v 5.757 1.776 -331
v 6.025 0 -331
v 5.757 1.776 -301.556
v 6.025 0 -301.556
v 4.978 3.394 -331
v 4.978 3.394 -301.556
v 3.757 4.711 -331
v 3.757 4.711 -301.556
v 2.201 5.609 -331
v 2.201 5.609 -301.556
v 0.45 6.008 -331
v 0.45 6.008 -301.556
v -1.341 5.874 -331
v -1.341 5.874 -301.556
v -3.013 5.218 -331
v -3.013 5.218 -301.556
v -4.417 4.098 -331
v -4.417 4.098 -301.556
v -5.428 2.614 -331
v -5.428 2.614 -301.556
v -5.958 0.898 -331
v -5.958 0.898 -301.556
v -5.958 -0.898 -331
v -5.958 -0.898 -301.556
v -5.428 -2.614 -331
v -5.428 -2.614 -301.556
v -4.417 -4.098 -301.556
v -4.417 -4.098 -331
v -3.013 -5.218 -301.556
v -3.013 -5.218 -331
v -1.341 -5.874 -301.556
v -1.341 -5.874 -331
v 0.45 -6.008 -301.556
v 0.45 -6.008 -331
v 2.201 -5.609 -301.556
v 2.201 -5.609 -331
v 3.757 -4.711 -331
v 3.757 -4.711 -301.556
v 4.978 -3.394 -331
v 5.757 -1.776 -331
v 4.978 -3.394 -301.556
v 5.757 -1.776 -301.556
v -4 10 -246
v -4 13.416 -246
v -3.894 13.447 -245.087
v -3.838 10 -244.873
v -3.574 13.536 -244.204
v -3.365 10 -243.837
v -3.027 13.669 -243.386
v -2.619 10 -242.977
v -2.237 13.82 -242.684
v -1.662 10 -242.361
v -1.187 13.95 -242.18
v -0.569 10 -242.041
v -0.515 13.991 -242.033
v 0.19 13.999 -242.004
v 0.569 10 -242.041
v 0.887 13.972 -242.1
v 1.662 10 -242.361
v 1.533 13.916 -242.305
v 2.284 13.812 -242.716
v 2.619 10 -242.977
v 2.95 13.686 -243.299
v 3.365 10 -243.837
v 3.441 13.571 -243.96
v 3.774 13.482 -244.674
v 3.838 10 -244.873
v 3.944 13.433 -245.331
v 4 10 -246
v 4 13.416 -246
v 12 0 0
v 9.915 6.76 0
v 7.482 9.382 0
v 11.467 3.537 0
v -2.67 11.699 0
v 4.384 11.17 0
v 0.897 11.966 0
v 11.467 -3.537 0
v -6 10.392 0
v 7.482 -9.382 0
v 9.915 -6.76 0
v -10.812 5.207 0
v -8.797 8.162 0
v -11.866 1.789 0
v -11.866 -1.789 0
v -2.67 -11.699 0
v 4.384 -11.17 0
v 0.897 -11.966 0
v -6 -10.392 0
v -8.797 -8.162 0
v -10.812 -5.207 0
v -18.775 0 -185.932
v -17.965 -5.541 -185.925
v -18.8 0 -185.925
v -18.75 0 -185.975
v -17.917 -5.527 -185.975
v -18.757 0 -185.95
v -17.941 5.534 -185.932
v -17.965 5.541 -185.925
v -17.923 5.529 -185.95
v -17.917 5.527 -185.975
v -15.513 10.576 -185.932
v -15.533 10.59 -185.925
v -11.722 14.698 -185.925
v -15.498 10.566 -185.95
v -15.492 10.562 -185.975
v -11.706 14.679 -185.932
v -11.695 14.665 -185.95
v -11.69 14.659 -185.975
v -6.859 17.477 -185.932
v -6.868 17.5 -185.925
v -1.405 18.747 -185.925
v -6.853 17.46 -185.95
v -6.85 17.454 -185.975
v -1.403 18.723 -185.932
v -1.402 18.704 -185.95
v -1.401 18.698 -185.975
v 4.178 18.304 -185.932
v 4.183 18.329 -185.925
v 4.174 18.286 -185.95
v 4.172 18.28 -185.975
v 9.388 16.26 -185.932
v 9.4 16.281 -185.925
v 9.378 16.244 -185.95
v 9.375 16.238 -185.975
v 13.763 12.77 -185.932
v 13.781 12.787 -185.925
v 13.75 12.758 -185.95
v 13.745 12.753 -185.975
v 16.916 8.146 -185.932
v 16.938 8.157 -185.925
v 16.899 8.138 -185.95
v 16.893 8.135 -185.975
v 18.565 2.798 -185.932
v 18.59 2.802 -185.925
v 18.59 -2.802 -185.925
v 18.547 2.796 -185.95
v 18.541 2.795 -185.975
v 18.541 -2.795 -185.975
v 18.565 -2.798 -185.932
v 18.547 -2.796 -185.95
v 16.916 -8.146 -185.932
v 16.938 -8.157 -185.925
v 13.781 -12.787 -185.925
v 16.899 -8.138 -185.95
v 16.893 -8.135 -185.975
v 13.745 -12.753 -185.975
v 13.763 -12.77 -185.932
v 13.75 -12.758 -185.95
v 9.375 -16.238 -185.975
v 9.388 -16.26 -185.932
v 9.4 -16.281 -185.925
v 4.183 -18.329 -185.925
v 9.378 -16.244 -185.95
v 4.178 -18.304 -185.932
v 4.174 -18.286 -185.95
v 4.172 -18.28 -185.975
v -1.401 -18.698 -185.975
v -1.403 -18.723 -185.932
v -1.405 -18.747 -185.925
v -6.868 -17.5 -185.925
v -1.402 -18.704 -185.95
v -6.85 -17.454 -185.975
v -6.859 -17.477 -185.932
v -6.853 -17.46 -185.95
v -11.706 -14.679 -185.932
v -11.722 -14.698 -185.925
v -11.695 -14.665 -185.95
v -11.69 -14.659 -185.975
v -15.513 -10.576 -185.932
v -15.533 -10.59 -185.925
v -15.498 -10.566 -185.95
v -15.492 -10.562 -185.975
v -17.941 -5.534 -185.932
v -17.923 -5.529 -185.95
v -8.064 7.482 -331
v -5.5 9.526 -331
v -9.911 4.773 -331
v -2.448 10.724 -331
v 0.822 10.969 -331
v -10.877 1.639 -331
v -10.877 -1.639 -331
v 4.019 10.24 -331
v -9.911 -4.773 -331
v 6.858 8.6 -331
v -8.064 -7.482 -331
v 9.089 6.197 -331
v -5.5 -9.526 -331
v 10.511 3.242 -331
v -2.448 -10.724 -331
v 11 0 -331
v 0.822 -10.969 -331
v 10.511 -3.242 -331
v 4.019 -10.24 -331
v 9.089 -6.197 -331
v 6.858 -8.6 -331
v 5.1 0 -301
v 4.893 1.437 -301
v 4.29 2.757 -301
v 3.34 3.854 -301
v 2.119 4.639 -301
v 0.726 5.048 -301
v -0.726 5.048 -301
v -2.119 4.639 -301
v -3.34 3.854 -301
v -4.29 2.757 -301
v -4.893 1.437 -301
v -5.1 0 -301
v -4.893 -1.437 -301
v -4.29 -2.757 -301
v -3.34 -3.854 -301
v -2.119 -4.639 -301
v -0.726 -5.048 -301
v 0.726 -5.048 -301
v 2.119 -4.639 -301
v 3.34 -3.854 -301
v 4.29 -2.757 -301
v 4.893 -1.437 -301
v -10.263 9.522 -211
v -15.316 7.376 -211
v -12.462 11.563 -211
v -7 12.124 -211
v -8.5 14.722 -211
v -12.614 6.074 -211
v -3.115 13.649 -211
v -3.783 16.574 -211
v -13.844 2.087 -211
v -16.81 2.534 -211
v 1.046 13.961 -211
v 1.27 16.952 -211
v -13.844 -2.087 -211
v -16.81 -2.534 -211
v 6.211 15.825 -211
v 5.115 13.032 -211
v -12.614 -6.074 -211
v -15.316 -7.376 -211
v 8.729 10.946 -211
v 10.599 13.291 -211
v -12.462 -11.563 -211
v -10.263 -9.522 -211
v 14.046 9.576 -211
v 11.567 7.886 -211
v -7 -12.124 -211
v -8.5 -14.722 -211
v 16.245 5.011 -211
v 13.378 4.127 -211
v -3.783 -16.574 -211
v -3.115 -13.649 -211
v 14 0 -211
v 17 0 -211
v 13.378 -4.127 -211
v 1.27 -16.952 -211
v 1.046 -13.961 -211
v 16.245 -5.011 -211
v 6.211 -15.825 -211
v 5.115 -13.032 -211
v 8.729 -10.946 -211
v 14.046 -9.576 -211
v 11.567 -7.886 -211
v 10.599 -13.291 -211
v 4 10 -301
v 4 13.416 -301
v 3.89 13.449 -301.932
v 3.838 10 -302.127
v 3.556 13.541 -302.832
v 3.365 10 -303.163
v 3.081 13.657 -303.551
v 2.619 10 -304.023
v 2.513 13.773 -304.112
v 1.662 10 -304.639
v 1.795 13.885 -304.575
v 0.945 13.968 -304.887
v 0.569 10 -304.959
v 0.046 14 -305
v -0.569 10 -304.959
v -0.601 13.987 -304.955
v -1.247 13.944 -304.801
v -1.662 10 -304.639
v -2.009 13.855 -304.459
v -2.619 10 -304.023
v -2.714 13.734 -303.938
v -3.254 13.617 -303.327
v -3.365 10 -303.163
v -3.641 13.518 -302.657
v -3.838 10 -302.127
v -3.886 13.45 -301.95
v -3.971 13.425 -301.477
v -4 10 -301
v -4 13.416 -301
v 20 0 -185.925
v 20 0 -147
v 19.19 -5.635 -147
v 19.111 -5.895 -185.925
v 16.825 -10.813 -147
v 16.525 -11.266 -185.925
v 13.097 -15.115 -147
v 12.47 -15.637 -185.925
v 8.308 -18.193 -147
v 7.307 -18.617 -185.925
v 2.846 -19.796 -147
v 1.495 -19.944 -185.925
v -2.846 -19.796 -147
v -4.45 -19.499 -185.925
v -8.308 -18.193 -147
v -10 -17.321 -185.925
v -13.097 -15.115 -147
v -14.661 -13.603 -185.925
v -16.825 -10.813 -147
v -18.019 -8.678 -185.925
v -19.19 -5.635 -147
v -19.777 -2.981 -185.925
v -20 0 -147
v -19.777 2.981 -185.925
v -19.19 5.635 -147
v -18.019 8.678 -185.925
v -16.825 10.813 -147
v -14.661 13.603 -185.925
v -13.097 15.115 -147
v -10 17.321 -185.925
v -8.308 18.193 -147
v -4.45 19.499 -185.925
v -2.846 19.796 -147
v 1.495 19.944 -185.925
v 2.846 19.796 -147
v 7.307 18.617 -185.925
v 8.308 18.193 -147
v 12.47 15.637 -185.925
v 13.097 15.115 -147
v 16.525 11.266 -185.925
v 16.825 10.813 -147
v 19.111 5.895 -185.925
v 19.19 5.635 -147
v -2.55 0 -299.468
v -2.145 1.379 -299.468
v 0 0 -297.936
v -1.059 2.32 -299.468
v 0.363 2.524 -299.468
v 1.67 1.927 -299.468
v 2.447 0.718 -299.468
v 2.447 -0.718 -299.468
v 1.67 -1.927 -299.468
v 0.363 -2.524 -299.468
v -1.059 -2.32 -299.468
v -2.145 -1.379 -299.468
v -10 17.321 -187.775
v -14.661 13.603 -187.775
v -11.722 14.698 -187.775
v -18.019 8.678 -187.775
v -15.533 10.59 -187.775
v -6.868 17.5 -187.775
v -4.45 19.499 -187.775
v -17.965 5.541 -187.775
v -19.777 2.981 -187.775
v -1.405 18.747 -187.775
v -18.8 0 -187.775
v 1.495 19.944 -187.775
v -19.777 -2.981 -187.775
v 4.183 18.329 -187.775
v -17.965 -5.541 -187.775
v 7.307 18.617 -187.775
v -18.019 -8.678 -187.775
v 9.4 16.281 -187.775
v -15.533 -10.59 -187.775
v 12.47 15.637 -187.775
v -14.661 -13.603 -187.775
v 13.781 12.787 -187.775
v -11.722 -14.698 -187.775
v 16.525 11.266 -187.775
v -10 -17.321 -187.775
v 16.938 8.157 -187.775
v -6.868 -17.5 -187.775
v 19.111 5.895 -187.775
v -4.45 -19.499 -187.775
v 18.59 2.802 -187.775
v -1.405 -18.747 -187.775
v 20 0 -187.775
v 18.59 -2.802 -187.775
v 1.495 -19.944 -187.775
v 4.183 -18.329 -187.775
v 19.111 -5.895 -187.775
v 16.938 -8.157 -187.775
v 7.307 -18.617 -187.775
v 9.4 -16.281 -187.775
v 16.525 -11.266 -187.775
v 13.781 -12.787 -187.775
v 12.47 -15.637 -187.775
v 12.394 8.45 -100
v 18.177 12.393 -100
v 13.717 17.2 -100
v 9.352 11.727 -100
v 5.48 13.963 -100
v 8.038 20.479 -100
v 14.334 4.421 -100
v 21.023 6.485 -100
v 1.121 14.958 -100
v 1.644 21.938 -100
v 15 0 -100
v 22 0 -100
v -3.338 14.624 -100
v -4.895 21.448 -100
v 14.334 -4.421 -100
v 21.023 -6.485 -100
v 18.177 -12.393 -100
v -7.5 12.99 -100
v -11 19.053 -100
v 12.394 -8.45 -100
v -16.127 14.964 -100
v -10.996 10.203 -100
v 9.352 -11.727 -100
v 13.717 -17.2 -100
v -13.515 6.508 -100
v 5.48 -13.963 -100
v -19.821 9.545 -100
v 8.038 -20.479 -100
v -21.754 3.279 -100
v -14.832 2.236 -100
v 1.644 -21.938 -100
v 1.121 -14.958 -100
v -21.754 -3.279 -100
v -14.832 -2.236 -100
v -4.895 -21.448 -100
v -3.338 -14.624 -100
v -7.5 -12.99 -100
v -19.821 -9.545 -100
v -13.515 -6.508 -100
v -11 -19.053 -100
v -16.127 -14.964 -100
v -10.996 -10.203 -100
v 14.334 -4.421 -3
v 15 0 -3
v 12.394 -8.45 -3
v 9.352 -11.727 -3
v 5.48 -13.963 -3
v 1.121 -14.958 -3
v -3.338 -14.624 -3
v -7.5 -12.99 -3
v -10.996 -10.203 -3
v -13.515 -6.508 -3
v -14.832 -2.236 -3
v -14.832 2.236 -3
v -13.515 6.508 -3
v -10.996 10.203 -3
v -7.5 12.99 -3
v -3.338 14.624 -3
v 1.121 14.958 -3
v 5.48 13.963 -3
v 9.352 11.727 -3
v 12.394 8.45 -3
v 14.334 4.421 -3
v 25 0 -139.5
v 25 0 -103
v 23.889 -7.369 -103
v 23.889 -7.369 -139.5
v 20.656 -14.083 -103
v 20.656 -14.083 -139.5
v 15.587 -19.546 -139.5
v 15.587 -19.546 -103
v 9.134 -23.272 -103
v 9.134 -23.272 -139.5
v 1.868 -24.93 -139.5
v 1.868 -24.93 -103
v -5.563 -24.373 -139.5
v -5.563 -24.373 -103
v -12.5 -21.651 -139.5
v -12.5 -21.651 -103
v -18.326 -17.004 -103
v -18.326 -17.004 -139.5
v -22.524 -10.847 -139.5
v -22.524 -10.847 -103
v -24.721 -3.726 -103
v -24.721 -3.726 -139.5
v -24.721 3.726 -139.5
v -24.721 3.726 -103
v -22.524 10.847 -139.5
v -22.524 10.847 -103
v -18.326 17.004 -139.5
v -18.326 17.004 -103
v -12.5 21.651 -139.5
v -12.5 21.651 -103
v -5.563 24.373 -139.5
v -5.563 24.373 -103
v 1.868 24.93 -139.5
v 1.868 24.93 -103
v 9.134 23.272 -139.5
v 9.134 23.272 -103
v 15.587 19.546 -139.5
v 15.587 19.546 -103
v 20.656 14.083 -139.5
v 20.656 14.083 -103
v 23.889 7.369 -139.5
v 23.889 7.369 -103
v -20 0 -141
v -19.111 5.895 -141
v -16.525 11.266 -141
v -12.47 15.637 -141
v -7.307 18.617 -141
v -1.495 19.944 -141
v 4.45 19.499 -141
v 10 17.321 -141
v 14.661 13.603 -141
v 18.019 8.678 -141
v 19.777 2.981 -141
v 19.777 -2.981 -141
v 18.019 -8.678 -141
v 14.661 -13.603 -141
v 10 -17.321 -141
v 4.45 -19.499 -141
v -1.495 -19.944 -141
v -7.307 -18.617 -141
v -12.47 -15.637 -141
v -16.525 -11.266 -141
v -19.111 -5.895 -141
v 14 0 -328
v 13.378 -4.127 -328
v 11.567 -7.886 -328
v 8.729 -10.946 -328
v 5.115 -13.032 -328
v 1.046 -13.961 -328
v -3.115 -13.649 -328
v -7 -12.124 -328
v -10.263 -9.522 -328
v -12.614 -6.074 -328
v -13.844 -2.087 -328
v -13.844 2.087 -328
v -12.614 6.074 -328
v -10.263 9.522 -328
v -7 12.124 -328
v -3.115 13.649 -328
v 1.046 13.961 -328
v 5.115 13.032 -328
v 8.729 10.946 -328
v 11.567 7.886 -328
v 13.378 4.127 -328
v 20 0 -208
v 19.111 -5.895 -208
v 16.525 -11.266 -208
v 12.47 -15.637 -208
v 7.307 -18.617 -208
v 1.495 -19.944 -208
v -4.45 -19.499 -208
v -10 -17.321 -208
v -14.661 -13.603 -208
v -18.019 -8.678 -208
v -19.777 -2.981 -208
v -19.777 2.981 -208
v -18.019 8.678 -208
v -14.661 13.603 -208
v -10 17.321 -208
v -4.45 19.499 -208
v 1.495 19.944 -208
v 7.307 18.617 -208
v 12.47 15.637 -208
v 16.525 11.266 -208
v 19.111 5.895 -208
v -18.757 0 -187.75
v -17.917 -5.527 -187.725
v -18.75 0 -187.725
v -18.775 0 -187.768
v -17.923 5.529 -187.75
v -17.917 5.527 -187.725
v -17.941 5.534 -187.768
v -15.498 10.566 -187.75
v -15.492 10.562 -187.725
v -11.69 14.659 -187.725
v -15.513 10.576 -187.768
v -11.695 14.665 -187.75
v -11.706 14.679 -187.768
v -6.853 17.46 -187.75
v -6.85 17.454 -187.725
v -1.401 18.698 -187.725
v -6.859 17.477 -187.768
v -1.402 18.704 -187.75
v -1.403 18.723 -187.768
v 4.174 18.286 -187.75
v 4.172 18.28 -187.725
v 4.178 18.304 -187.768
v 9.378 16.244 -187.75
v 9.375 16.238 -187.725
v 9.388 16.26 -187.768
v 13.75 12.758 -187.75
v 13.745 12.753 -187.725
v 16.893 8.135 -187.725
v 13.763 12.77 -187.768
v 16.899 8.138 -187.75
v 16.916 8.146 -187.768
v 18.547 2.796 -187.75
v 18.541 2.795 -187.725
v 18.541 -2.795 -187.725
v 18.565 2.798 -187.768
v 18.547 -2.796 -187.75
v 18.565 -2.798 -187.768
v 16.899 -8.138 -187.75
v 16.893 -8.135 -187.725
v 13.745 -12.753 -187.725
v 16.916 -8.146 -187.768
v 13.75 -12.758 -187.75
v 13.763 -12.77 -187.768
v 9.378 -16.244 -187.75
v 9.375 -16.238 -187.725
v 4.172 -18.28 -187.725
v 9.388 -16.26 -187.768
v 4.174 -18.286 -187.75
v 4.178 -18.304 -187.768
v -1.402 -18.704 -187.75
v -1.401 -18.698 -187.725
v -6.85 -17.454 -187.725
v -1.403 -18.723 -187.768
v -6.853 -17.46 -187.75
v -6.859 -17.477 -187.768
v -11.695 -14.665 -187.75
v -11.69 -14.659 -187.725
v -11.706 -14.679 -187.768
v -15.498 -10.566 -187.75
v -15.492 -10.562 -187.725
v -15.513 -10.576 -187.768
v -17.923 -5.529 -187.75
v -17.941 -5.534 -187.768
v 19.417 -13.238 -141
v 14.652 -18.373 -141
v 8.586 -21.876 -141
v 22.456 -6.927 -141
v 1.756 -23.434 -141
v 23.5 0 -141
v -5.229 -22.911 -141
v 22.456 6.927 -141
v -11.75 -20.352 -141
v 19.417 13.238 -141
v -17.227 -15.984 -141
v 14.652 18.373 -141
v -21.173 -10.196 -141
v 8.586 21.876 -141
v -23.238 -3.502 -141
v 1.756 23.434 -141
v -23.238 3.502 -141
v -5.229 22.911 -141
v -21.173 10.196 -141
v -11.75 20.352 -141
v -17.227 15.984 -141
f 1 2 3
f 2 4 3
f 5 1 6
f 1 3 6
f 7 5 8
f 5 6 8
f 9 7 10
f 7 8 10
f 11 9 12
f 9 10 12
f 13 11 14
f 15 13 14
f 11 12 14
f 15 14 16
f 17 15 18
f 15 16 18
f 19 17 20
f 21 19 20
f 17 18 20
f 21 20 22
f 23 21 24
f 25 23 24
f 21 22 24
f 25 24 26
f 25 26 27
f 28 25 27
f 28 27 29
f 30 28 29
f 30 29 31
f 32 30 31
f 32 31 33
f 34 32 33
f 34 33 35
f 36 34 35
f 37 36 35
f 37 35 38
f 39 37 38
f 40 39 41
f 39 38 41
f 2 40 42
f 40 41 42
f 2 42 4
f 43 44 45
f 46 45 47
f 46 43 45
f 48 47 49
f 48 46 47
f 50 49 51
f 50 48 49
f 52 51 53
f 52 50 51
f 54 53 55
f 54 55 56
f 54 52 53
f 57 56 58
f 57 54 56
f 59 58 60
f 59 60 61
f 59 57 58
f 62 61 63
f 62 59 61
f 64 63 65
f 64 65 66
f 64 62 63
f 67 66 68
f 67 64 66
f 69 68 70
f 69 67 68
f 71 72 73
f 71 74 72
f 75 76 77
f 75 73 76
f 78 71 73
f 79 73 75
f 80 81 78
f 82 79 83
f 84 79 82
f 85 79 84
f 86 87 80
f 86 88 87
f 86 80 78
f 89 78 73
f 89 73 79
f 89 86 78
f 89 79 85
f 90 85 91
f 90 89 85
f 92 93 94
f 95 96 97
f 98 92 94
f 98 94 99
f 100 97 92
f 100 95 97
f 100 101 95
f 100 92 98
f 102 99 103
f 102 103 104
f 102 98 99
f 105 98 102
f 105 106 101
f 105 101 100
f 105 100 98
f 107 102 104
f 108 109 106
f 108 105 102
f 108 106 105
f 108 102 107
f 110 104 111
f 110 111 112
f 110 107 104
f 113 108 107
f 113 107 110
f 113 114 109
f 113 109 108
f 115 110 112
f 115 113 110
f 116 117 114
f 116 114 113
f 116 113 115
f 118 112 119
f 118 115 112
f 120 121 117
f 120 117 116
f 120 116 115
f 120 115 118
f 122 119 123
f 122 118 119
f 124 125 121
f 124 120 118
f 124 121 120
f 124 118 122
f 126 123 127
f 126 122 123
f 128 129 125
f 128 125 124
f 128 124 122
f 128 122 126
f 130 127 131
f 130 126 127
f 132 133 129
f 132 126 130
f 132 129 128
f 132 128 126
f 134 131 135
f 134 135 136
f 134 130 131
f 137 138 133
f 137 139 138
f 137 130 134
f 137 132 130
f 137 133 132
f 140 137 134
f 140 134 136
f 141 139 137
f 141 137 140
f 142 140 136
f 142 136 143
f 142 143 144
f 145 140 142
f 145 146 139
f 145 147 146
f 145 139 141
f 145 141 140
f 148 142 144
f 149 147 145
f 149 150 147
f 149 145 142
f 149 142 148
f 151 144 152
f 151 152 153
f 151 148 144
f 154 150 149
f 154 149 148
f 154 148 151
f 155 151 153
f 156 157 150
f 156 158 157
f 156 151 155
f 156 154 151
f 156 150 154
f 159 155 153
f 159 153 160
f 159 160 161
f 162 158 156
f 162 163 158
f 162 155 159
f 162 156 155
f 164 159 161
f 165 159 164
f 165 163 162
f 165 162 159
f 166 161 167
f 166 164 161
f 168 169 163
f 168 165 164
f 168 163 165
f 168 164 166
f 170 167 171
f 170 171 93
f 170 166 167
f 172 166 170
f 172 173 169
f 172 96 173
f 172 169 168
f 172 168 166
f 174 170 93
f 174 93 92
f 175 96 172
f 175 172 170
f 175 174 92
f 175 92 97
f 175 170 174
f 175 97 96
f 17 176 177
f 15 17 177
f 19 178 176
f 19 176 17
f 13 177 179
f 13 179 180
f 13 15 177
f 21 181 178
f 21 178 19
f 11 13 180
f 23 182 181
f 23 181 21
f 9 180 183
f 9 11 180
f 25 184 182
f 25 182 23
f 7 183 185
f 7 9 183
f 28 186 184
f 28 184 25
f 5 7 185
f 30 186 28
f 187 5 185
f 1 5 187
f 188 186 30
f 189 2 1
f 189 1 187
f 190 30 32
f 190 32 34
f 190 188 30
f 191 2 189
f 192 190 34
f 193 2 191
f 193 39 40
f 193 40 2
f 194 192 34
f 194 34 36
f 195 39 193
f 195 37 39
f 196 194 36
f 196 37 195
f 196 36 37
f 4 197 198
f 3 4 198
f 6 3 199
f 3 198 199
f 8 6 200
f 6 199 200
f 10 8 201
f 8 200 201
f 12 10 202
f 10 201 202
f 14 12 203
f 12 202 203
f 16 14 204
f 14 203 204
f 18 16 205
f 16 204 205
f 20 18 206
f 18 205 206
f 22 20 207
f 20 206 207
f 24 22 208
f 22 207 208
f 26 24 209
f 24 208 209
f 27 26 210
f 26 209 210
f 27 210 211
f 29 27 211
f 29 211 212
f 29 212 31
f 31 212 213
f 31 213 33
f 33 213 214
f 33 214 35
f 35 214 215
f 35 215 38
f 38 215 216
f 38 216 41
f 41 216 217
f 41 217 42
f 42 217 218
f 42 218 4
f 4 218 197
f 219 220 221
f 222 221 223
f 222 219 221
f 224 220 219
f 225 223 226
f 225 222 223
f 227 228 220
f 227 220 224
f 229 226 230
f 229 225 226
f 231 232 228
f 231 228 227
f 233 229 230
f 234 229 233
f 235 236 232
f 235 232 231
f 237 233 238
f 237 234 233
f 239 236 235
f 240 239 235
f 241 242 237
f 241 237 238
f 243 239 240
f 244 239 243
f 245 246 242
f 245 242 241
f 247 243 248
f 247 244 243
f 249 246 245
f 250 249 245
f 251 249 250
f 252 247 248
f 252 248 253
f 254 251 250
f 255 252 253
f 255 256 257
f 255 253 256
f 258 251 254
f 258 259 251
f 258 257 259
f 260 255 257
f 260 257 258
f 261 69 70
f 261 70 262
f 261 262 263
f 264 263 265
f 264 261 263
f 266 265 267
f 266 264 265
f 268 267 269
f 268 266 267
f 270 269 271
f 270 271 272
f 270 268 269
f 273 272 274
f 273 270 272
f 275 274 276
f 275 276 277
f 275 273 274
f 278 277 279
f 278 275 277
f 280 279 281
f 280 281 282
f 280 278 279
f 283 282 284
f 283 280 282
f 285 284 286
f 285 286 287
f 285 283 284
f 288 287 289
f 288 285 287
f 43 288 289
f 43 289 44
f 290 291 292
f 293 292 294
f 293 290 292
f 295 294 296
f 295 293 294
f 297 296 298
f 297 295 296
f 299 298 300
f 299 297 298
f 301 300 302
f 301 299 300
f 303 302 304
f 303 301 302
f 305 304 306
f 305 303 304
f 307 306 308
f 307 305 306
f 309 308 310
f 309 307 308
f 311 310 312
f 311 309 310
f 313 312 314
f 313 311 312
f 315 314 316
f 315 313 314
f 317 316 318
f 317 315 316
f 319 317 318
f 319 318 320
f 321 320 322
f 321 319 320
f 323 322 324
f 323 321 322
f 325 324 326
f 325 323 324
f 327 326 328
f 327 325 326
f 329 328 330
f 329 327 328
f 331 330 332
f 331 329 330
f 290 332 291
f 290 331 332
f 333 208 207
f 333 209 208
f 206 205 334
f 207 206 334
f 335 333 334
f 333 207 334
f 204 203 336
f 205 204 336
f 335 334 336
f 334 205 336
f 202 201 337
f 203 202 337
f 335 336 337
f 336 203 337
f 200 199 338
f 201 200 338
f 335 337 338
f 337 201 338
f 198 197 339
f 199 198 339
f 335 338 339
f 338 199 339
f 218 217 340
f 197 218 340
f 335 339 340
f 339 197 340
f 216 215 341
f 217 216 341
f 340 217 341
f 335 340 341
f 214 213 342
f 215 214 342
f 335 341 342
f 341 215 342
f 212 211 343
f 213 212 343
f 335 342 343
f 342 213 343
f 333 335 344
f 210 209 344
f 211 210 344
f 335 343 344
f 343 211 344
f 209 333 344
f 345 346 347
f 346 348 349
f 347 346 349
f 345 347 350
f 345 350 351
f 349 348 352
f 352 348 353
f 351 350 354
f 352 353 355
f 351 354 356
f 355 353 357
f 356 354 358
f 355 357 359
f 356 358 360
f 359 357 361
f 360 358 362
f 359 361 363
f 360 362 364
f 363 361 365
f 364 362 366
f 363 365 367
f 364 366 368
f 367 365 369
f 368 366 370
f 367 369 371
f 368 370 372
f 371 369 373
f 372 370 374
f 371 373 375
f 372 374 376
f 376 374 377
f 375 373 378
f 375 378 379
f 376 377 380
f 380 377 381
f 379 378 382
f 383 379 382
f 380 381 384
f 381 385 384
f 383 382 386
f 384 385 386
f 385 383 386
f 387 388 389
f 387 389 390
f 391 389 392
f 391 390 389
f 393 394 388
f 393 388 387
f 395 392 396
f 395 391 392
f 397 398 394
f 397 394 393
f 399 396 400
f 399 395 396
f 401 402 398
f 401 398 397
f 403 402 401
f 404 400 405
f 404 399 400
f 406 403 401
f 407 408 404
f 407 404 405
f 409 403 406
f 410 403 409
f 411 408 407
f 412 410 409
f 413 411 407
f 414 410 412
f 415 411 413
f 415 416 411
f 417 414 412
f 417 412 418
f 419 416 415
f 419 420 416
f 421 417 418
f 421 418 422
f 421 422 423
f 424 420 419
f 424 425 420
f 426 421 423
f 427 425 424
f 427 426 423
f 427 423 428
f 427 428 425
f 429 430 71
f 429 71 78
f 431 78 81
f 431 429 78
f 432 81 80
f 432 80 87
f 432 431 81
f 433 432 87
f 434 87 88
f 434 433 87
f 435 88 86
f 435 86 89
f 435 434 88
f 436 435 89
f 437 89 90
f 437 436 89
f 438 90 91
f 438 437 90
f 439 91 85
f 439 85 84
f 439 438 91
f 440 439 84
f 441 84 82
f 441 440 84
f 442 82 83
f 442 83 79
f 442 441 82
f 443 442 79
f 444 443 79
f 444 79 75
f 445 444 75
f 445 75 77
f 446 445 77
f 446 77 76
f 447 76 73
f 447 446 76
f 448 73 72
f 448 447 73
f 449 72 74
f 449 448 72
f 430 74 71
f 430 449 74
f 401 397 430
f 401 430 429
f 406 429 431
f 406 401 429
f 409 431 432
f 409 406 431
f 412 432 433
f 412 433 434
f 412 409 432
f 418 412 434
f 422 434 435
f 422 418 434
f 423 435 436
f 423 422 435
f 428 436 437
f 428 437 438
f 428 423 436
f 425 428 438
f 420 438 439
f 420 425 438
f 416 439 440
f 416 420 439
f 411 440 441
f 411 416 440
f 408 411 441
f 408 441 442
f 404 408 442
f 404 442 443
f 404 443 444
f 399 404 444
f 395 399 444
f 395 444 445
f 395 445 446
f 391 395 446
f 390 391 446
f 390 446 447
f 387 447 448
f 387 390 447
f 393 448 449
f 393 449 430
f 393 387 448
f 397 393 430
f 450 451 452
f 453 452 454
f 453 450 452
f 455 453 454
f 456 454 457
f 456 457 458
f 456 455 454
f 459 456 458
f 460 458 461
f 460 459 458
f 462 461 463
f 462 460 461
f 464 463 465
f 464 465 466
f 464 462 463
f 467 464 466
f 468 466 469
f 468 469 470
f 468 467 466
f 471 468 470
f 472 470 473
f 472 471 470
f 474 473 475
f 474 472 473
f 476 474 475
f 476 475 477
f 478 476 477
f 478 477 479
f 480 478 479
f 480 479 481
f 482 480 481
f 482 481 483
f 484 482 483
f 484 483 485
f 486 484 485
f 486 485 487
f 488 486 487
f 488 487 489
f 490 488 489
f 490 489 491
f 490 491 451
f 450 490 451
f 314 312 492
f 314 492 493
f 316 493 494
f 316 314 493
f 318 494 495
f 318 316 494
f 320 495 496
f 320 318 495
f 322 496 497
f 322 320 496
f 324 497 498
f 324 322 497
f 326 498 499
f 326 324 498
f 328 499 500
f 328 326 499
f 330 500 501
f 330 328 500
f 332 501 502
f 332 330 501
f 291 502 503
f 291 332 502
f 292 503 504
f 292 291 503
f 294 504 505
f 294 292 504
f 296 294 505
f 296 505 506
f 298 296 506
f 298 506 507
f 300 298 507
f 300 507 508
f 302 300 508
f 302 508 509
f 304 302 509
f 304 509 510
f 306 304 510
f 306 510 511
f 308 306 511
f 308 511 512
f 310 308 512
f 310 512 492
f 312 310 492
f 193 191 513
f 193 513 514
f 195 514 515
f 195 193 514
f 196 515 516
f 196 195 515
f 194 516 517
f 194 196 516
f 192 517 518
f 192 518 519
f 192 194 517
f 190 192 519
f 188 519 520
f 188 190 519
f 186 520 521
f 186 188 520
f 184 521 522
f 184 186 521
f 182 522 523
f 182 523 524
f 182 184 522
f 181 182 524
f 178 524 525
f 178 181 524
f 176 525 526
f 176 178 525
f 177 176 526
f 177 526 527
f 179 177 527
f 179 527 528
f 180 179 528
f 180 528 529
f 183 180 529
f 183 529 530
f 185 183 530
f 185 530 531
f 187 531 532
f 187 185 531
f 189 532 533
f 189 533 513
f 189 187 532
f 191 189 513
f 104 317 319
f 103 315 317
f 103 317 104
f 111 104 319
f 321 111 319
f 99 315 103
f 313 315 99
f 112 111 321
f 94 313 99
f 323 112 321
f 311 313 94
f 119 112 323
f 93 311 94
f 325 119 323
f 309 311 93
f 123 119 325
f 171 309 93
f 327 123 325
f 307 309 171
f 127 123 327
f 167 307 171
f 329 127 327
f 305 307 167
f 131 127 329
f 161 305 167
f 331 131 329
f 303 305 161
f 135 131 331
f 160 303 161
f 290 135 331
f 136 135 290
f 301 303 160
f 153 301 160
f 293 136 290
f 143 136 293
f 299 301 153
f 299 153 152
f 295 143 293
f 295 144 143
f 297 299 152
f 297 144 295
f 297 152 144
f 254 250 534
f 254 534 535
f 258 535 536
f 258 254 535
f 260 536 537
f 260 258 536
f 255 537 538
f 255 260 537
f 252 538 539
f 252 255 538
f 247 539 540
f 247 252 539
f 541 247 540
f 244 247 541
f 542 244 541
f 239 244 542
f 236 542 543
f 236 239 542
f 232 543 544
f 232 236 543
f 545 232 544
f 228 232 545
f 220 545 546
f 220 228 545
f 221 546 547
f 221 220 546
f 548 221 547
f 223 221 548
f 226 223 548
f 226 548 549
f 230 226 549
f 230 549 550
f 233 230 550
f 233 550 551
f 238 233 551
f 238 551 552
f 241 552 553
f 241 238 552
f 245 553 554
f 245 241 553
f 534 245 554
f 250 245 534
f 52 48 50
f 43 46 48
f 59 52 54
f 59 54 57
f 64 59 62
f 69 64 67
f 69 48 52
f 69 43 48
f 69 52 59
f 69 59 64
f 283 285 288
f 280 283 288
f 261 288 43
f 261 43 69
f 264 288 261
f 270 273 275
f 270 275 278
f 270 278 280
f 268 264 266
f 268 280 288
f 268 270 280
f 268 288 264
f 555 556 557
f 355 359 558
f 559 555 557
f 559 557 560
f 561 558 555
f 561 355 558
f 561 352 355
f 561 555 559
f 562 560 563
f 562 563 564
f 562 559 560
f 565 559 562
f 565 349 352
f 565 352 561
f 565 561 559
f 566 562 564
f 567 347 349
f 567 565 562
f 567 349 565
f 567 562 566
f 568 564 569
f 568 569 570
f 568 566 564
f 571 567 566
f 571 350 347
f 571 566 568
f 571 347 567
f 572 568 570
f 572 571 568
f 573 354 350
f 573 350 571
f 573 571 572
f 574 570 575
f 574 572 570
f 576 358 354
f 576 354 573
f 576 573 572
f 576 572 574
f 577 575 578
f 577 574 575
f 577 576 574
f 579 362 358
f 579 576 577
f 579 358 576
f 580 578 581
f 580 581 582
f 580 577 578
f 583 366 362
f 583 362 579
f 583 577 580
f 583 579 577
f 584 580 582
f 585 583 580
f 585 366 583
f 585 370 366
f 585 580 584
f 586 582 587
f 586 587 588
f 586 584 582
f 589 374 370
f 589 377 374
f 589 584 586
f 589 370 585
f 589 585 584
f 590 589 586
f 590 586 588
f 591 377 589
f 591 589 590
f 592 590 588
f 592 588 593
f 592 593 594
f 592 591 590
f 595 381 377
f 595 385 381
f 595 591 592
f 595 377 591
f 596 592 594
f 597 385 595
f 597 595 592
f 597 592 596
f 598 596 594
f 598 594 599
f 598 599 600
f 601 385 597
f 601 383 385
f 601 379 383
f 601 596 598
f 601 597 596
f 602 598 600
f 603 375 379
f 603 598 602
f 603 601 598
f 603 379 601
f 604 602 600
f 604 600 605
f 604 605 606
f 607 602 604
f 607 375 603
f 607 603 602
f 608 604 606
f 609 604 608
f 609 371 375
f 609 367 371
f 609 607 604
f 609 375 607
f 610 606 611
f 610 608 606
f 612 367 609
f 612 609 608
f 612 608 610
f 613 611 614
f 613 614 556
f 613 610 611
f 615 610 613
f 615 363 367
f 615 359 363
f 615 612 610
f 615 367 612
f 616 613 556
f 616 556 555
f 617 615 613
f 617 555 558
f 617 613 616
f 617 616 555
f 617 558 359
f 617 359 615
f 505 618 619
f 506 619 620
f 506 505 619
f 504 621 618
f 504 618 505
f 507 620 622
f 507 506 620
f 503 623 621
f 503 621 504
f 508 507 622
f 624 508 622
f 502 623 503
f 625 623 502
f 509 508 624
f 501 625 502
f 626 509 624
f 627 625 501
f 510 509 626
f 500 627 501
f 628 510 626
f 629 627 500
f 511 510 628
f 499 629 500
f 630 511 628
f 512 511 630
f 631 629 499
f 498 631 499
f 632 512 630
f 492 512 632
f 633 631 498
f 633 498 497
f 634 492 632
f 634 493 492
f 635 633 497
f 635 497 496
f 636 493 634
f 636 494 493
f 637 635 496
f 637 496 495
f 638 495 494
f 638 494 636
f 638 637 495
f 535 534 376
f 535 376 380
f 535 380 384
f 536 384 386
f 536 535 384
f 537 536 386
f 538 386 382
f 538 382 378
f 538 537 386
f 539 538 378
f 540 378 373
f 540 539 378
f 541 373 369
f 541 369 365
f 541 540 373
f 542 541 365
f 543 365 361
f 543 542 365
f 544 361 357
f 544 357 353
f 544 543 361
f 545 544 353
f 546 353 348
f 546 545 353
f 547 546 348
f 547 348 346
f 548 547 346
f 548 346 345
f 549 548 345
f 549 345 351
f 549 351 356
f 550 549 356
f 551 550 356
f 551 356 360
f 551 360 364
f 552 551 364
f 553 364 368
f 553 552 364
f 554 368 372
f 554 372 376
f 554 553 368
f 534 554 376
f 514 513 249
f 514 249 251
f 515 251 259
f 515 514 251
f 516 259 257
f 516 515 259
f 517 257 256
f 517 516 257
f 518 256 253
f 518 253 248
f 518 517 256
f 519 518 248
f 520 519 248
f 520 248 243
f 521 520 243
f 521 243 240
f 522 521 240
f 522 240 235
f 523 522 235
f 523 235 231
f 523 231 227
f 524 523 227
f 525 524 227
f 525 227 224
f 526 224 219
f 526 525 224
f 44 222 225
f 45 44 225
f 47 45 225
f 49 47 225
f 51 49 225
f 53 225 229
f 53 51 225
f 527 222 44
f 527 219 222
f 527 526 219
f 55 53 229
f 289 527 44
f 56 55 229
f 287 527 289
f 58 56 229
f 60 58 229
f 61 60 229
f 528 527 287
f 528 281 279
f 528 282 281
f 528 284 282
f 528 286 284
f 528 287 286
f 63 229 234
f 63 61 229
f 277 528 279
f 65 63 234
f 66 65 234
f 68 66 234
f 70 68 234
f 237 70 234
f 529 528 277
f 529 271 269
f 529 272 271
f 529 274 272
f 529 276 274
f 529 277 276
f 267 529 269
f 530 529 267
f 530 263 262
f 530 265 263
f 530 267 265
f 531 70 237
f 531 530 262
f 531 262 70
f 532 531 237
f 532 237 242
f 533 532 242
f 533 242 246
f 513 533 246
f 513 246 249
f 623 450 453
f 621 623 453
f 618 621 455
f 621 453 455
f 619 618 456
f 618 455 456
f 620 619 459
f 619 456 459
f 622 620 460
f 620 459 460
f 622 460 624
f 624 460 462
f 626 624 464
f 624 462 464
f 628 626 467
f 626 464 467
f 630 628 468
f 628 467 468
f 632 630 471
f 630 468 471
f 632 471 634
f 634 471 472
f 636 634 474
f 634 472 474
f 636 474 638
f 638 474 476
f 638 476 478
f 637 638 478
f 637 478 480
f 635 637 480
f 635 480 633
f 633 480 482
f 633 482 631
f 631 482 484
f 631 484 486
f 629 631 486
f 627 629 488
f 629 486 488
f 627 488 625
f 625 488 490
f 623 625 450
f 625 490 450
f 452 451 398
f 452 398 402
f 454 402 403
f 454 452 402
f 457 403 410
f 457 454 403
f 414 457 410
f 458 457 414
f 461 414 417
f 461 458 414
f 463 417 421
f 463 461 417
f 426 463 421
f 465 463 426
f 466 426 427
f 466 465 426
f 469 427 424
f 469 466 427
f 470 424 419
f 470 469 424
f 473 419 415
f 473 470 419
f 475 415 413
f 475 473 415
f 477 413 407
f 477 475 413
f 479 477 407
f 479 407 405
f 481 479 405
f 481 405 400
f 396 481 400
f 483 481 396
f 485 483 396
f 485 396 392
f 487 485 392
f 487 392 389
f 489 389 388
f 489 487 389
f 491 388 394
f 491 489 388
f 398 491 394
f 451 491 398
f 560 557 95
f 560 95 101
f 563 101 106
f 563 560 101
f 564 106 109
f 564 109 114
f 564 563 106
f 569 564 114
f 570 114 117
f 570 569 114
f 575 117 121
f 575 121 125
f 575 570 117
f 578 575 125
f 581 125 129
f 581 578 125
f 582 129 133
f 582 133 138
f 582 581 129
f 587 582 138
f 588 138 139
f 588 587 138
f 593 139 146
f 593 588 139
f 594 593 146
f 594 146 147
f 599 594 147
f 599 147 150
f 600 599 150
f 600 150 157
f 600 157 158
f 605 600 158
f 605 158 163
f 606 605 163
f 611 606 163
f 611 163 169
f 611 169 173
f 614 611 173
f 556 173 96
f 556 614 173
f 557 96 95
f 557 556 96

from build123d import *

# Parameters (mm, degrees)
CHAMFER_1_SIZE         = 3
HOLE_WIZARD_M121_D     = 10.2
HOLE_WIZARD_M121_DEPTH = 30
HOLE_WIZARD_M121_TIP   = 3.064389157
SKETCH_4_R             = 20
SKETCH_4_R_2           = 18.75
CUT_EXTRUDE_1_DEPTH    = 1.85
FILLET_1_R             = 0.05
CHAMFER_2_SIZE         = 1.5
CUT_EXTRUDE_2_DEPTH    = 334.782863551
SKETCH_9_R             = 25
SKETCH_9_R_2           = 20
CUT_EXTRUDE_4_DEPTH    = 6
CHAMFER_3_SIZE         = 1.5
CHAMFER_4_SIZE         = 3


# Read off the part's stored shape, not the designer's step: Условная геометрия резьбовых отверстий
with BuildPart() as part:
    # Эскиз1 → Повернуть1 (revolve)
    with BuildSketch(Plane(origin=(0, 0, 0), x_dir=(0, 0, -1), z_dir=(1, 0, 0)), mode=Mode.PRIVATE) as revolve_1_sk:
        Polygon((0, 0), (0, 15), (100, 15), (100, 25), (147, 25), (147, 20), (211, 20), (211, 14), (331, 14), (331, 0), align=None)
    revolve(revolve_1_sk.sketch.rotate(Axis((0, 0, 0), (0, 0, -1)), 90), axis=Axis((0, 0, 0), (0, 0, -1)))

    # Фаска1
    chamfer_1_edges = [part.edges().sort_by_distance(p)[0] for p in [
        (-25, 0, -100),
        (-15, 0, 0),
        (-14, 0, -331),
    ]]
    chamfer(chamfer_1_edges, length=CHAMFER_1_SIZE)

    # Отверстие обработанное метчиком M121
    with Locations(Plane(origin=(0, 0, -331), x_dir=(-1, 0, 0), z_dir=(0, 0, -1))):
        with Locations((0, 0)):
            Hole(HOLE_WIZARD_M121_D / 2, depth=HOLE_WIZARD_M121_DEPTH)
            with Locations((0, 0, -(HOLE_WIZARD_M121_DEPTH + HOLE_WIZARD_M121_TIP / 2))):  # 118° drill point
                Cone(0, HOLE_WIZARD_M121_D / 2, HOLE_WIZARD_M121_TIP, mode=Mode.SUBTRACT)

    # Эскиз4 → Вырез-Вытянуть1 (cut)
    with BuildSketch(Plane(origin=(0, 0, -187.775), x_dir=(-1, 0, 0), z_dir=(0, 0, -1))):
        with Locations(Location((0, 0, 0), (0, 0, 180))):
            Circle(SKETCH_4_R)
        Circle(SKETCH_4_R_2, mode=Mode.SUBTRACT)
    extrude(amount=-CUT_EXTRUDE_1_DEPTH, mode=Mode.SUBTRACT)

    # Скругление1
    fillet_1_edges = [part.edges().sort_by_distance(p)[0] for p in [
        (18.75, 0, -185.925),
        (18.75, 0, -187.775),
    ]]
    fillet(fillet_1_edges, radius=FILLET_1_R)

    # Фаска2
    chamfer_2_edges = [part.edges().sort_by_distance(p)[0] for p in [
        (-25, 0, -147),
    ]]
    chamfer(chamfer_2_edges, length=CHAMFER_2_SIZE)

    # Эскиз8 → Вырез-Вытянуть2 (cut, through all)
    with BuildSketch(Plane(origin=(0, 10, -331), x_dir=(-1, 0, 0), z_dir=(0, -1, 0))):
        with BuildLine():
            Line((4, -30), (4, -85))
            ThreePointArc((4, -85), (0, -89), (-4, -85))
            Line((-4, -85), (-4, -30))
            ThreePointArc((-4, -30), (0, -26), (4, -30))
        make_face()
    extrude(amount=-CUT_EXTRUDE_2_DEPTH, mode=Mode.SUBTRACT)

    # Эскиз9 → Вырез-Вытянуть4 (cut)
    with BuildSketch(Plane(origin=(0, 0, -147), x_dir=(-1, 0, 0), z_dir=(0, 0, -1))):
        Circle(SKETCH_9_R)
        Circle(SKETCH_9_R_2, mode=Mode.SUBTRACT)
    extrude(amount=-CUT_EXTRUDE_4_DEPTH, mode=Mode.SUBTRACT)

    # Фаска3
    chamfer_3_edges = [part.edges().sort_by_distance(p)[0] for p in [
        (-25, 0, -141),
    ]]
    chamfer(chamfer_3_edges, length=CHAMFER_3_SIZE)

    # Фаска4
    chamfer_4_edges = [part.edges().sort_by_distance(p)[0] for p in [
        (-20, 0, -211),
    ]]
    chamfer(chamfer_4_edges, length=CHAMFER_4_SIZE)

    # Move Face 2213 outline → Move Face 2213 (revolve, cut)
    with BuildSketch(Plane.XZ):
        Polygon((6.025, -301.555796073), (5.1, -301), (5.1, -331), (6.025, -331), align=None)
    revolve(axis=Axis((0, 0, 0), (0, 0, 1)), mode=Mode.SUBTRACT)


solid = part.part
